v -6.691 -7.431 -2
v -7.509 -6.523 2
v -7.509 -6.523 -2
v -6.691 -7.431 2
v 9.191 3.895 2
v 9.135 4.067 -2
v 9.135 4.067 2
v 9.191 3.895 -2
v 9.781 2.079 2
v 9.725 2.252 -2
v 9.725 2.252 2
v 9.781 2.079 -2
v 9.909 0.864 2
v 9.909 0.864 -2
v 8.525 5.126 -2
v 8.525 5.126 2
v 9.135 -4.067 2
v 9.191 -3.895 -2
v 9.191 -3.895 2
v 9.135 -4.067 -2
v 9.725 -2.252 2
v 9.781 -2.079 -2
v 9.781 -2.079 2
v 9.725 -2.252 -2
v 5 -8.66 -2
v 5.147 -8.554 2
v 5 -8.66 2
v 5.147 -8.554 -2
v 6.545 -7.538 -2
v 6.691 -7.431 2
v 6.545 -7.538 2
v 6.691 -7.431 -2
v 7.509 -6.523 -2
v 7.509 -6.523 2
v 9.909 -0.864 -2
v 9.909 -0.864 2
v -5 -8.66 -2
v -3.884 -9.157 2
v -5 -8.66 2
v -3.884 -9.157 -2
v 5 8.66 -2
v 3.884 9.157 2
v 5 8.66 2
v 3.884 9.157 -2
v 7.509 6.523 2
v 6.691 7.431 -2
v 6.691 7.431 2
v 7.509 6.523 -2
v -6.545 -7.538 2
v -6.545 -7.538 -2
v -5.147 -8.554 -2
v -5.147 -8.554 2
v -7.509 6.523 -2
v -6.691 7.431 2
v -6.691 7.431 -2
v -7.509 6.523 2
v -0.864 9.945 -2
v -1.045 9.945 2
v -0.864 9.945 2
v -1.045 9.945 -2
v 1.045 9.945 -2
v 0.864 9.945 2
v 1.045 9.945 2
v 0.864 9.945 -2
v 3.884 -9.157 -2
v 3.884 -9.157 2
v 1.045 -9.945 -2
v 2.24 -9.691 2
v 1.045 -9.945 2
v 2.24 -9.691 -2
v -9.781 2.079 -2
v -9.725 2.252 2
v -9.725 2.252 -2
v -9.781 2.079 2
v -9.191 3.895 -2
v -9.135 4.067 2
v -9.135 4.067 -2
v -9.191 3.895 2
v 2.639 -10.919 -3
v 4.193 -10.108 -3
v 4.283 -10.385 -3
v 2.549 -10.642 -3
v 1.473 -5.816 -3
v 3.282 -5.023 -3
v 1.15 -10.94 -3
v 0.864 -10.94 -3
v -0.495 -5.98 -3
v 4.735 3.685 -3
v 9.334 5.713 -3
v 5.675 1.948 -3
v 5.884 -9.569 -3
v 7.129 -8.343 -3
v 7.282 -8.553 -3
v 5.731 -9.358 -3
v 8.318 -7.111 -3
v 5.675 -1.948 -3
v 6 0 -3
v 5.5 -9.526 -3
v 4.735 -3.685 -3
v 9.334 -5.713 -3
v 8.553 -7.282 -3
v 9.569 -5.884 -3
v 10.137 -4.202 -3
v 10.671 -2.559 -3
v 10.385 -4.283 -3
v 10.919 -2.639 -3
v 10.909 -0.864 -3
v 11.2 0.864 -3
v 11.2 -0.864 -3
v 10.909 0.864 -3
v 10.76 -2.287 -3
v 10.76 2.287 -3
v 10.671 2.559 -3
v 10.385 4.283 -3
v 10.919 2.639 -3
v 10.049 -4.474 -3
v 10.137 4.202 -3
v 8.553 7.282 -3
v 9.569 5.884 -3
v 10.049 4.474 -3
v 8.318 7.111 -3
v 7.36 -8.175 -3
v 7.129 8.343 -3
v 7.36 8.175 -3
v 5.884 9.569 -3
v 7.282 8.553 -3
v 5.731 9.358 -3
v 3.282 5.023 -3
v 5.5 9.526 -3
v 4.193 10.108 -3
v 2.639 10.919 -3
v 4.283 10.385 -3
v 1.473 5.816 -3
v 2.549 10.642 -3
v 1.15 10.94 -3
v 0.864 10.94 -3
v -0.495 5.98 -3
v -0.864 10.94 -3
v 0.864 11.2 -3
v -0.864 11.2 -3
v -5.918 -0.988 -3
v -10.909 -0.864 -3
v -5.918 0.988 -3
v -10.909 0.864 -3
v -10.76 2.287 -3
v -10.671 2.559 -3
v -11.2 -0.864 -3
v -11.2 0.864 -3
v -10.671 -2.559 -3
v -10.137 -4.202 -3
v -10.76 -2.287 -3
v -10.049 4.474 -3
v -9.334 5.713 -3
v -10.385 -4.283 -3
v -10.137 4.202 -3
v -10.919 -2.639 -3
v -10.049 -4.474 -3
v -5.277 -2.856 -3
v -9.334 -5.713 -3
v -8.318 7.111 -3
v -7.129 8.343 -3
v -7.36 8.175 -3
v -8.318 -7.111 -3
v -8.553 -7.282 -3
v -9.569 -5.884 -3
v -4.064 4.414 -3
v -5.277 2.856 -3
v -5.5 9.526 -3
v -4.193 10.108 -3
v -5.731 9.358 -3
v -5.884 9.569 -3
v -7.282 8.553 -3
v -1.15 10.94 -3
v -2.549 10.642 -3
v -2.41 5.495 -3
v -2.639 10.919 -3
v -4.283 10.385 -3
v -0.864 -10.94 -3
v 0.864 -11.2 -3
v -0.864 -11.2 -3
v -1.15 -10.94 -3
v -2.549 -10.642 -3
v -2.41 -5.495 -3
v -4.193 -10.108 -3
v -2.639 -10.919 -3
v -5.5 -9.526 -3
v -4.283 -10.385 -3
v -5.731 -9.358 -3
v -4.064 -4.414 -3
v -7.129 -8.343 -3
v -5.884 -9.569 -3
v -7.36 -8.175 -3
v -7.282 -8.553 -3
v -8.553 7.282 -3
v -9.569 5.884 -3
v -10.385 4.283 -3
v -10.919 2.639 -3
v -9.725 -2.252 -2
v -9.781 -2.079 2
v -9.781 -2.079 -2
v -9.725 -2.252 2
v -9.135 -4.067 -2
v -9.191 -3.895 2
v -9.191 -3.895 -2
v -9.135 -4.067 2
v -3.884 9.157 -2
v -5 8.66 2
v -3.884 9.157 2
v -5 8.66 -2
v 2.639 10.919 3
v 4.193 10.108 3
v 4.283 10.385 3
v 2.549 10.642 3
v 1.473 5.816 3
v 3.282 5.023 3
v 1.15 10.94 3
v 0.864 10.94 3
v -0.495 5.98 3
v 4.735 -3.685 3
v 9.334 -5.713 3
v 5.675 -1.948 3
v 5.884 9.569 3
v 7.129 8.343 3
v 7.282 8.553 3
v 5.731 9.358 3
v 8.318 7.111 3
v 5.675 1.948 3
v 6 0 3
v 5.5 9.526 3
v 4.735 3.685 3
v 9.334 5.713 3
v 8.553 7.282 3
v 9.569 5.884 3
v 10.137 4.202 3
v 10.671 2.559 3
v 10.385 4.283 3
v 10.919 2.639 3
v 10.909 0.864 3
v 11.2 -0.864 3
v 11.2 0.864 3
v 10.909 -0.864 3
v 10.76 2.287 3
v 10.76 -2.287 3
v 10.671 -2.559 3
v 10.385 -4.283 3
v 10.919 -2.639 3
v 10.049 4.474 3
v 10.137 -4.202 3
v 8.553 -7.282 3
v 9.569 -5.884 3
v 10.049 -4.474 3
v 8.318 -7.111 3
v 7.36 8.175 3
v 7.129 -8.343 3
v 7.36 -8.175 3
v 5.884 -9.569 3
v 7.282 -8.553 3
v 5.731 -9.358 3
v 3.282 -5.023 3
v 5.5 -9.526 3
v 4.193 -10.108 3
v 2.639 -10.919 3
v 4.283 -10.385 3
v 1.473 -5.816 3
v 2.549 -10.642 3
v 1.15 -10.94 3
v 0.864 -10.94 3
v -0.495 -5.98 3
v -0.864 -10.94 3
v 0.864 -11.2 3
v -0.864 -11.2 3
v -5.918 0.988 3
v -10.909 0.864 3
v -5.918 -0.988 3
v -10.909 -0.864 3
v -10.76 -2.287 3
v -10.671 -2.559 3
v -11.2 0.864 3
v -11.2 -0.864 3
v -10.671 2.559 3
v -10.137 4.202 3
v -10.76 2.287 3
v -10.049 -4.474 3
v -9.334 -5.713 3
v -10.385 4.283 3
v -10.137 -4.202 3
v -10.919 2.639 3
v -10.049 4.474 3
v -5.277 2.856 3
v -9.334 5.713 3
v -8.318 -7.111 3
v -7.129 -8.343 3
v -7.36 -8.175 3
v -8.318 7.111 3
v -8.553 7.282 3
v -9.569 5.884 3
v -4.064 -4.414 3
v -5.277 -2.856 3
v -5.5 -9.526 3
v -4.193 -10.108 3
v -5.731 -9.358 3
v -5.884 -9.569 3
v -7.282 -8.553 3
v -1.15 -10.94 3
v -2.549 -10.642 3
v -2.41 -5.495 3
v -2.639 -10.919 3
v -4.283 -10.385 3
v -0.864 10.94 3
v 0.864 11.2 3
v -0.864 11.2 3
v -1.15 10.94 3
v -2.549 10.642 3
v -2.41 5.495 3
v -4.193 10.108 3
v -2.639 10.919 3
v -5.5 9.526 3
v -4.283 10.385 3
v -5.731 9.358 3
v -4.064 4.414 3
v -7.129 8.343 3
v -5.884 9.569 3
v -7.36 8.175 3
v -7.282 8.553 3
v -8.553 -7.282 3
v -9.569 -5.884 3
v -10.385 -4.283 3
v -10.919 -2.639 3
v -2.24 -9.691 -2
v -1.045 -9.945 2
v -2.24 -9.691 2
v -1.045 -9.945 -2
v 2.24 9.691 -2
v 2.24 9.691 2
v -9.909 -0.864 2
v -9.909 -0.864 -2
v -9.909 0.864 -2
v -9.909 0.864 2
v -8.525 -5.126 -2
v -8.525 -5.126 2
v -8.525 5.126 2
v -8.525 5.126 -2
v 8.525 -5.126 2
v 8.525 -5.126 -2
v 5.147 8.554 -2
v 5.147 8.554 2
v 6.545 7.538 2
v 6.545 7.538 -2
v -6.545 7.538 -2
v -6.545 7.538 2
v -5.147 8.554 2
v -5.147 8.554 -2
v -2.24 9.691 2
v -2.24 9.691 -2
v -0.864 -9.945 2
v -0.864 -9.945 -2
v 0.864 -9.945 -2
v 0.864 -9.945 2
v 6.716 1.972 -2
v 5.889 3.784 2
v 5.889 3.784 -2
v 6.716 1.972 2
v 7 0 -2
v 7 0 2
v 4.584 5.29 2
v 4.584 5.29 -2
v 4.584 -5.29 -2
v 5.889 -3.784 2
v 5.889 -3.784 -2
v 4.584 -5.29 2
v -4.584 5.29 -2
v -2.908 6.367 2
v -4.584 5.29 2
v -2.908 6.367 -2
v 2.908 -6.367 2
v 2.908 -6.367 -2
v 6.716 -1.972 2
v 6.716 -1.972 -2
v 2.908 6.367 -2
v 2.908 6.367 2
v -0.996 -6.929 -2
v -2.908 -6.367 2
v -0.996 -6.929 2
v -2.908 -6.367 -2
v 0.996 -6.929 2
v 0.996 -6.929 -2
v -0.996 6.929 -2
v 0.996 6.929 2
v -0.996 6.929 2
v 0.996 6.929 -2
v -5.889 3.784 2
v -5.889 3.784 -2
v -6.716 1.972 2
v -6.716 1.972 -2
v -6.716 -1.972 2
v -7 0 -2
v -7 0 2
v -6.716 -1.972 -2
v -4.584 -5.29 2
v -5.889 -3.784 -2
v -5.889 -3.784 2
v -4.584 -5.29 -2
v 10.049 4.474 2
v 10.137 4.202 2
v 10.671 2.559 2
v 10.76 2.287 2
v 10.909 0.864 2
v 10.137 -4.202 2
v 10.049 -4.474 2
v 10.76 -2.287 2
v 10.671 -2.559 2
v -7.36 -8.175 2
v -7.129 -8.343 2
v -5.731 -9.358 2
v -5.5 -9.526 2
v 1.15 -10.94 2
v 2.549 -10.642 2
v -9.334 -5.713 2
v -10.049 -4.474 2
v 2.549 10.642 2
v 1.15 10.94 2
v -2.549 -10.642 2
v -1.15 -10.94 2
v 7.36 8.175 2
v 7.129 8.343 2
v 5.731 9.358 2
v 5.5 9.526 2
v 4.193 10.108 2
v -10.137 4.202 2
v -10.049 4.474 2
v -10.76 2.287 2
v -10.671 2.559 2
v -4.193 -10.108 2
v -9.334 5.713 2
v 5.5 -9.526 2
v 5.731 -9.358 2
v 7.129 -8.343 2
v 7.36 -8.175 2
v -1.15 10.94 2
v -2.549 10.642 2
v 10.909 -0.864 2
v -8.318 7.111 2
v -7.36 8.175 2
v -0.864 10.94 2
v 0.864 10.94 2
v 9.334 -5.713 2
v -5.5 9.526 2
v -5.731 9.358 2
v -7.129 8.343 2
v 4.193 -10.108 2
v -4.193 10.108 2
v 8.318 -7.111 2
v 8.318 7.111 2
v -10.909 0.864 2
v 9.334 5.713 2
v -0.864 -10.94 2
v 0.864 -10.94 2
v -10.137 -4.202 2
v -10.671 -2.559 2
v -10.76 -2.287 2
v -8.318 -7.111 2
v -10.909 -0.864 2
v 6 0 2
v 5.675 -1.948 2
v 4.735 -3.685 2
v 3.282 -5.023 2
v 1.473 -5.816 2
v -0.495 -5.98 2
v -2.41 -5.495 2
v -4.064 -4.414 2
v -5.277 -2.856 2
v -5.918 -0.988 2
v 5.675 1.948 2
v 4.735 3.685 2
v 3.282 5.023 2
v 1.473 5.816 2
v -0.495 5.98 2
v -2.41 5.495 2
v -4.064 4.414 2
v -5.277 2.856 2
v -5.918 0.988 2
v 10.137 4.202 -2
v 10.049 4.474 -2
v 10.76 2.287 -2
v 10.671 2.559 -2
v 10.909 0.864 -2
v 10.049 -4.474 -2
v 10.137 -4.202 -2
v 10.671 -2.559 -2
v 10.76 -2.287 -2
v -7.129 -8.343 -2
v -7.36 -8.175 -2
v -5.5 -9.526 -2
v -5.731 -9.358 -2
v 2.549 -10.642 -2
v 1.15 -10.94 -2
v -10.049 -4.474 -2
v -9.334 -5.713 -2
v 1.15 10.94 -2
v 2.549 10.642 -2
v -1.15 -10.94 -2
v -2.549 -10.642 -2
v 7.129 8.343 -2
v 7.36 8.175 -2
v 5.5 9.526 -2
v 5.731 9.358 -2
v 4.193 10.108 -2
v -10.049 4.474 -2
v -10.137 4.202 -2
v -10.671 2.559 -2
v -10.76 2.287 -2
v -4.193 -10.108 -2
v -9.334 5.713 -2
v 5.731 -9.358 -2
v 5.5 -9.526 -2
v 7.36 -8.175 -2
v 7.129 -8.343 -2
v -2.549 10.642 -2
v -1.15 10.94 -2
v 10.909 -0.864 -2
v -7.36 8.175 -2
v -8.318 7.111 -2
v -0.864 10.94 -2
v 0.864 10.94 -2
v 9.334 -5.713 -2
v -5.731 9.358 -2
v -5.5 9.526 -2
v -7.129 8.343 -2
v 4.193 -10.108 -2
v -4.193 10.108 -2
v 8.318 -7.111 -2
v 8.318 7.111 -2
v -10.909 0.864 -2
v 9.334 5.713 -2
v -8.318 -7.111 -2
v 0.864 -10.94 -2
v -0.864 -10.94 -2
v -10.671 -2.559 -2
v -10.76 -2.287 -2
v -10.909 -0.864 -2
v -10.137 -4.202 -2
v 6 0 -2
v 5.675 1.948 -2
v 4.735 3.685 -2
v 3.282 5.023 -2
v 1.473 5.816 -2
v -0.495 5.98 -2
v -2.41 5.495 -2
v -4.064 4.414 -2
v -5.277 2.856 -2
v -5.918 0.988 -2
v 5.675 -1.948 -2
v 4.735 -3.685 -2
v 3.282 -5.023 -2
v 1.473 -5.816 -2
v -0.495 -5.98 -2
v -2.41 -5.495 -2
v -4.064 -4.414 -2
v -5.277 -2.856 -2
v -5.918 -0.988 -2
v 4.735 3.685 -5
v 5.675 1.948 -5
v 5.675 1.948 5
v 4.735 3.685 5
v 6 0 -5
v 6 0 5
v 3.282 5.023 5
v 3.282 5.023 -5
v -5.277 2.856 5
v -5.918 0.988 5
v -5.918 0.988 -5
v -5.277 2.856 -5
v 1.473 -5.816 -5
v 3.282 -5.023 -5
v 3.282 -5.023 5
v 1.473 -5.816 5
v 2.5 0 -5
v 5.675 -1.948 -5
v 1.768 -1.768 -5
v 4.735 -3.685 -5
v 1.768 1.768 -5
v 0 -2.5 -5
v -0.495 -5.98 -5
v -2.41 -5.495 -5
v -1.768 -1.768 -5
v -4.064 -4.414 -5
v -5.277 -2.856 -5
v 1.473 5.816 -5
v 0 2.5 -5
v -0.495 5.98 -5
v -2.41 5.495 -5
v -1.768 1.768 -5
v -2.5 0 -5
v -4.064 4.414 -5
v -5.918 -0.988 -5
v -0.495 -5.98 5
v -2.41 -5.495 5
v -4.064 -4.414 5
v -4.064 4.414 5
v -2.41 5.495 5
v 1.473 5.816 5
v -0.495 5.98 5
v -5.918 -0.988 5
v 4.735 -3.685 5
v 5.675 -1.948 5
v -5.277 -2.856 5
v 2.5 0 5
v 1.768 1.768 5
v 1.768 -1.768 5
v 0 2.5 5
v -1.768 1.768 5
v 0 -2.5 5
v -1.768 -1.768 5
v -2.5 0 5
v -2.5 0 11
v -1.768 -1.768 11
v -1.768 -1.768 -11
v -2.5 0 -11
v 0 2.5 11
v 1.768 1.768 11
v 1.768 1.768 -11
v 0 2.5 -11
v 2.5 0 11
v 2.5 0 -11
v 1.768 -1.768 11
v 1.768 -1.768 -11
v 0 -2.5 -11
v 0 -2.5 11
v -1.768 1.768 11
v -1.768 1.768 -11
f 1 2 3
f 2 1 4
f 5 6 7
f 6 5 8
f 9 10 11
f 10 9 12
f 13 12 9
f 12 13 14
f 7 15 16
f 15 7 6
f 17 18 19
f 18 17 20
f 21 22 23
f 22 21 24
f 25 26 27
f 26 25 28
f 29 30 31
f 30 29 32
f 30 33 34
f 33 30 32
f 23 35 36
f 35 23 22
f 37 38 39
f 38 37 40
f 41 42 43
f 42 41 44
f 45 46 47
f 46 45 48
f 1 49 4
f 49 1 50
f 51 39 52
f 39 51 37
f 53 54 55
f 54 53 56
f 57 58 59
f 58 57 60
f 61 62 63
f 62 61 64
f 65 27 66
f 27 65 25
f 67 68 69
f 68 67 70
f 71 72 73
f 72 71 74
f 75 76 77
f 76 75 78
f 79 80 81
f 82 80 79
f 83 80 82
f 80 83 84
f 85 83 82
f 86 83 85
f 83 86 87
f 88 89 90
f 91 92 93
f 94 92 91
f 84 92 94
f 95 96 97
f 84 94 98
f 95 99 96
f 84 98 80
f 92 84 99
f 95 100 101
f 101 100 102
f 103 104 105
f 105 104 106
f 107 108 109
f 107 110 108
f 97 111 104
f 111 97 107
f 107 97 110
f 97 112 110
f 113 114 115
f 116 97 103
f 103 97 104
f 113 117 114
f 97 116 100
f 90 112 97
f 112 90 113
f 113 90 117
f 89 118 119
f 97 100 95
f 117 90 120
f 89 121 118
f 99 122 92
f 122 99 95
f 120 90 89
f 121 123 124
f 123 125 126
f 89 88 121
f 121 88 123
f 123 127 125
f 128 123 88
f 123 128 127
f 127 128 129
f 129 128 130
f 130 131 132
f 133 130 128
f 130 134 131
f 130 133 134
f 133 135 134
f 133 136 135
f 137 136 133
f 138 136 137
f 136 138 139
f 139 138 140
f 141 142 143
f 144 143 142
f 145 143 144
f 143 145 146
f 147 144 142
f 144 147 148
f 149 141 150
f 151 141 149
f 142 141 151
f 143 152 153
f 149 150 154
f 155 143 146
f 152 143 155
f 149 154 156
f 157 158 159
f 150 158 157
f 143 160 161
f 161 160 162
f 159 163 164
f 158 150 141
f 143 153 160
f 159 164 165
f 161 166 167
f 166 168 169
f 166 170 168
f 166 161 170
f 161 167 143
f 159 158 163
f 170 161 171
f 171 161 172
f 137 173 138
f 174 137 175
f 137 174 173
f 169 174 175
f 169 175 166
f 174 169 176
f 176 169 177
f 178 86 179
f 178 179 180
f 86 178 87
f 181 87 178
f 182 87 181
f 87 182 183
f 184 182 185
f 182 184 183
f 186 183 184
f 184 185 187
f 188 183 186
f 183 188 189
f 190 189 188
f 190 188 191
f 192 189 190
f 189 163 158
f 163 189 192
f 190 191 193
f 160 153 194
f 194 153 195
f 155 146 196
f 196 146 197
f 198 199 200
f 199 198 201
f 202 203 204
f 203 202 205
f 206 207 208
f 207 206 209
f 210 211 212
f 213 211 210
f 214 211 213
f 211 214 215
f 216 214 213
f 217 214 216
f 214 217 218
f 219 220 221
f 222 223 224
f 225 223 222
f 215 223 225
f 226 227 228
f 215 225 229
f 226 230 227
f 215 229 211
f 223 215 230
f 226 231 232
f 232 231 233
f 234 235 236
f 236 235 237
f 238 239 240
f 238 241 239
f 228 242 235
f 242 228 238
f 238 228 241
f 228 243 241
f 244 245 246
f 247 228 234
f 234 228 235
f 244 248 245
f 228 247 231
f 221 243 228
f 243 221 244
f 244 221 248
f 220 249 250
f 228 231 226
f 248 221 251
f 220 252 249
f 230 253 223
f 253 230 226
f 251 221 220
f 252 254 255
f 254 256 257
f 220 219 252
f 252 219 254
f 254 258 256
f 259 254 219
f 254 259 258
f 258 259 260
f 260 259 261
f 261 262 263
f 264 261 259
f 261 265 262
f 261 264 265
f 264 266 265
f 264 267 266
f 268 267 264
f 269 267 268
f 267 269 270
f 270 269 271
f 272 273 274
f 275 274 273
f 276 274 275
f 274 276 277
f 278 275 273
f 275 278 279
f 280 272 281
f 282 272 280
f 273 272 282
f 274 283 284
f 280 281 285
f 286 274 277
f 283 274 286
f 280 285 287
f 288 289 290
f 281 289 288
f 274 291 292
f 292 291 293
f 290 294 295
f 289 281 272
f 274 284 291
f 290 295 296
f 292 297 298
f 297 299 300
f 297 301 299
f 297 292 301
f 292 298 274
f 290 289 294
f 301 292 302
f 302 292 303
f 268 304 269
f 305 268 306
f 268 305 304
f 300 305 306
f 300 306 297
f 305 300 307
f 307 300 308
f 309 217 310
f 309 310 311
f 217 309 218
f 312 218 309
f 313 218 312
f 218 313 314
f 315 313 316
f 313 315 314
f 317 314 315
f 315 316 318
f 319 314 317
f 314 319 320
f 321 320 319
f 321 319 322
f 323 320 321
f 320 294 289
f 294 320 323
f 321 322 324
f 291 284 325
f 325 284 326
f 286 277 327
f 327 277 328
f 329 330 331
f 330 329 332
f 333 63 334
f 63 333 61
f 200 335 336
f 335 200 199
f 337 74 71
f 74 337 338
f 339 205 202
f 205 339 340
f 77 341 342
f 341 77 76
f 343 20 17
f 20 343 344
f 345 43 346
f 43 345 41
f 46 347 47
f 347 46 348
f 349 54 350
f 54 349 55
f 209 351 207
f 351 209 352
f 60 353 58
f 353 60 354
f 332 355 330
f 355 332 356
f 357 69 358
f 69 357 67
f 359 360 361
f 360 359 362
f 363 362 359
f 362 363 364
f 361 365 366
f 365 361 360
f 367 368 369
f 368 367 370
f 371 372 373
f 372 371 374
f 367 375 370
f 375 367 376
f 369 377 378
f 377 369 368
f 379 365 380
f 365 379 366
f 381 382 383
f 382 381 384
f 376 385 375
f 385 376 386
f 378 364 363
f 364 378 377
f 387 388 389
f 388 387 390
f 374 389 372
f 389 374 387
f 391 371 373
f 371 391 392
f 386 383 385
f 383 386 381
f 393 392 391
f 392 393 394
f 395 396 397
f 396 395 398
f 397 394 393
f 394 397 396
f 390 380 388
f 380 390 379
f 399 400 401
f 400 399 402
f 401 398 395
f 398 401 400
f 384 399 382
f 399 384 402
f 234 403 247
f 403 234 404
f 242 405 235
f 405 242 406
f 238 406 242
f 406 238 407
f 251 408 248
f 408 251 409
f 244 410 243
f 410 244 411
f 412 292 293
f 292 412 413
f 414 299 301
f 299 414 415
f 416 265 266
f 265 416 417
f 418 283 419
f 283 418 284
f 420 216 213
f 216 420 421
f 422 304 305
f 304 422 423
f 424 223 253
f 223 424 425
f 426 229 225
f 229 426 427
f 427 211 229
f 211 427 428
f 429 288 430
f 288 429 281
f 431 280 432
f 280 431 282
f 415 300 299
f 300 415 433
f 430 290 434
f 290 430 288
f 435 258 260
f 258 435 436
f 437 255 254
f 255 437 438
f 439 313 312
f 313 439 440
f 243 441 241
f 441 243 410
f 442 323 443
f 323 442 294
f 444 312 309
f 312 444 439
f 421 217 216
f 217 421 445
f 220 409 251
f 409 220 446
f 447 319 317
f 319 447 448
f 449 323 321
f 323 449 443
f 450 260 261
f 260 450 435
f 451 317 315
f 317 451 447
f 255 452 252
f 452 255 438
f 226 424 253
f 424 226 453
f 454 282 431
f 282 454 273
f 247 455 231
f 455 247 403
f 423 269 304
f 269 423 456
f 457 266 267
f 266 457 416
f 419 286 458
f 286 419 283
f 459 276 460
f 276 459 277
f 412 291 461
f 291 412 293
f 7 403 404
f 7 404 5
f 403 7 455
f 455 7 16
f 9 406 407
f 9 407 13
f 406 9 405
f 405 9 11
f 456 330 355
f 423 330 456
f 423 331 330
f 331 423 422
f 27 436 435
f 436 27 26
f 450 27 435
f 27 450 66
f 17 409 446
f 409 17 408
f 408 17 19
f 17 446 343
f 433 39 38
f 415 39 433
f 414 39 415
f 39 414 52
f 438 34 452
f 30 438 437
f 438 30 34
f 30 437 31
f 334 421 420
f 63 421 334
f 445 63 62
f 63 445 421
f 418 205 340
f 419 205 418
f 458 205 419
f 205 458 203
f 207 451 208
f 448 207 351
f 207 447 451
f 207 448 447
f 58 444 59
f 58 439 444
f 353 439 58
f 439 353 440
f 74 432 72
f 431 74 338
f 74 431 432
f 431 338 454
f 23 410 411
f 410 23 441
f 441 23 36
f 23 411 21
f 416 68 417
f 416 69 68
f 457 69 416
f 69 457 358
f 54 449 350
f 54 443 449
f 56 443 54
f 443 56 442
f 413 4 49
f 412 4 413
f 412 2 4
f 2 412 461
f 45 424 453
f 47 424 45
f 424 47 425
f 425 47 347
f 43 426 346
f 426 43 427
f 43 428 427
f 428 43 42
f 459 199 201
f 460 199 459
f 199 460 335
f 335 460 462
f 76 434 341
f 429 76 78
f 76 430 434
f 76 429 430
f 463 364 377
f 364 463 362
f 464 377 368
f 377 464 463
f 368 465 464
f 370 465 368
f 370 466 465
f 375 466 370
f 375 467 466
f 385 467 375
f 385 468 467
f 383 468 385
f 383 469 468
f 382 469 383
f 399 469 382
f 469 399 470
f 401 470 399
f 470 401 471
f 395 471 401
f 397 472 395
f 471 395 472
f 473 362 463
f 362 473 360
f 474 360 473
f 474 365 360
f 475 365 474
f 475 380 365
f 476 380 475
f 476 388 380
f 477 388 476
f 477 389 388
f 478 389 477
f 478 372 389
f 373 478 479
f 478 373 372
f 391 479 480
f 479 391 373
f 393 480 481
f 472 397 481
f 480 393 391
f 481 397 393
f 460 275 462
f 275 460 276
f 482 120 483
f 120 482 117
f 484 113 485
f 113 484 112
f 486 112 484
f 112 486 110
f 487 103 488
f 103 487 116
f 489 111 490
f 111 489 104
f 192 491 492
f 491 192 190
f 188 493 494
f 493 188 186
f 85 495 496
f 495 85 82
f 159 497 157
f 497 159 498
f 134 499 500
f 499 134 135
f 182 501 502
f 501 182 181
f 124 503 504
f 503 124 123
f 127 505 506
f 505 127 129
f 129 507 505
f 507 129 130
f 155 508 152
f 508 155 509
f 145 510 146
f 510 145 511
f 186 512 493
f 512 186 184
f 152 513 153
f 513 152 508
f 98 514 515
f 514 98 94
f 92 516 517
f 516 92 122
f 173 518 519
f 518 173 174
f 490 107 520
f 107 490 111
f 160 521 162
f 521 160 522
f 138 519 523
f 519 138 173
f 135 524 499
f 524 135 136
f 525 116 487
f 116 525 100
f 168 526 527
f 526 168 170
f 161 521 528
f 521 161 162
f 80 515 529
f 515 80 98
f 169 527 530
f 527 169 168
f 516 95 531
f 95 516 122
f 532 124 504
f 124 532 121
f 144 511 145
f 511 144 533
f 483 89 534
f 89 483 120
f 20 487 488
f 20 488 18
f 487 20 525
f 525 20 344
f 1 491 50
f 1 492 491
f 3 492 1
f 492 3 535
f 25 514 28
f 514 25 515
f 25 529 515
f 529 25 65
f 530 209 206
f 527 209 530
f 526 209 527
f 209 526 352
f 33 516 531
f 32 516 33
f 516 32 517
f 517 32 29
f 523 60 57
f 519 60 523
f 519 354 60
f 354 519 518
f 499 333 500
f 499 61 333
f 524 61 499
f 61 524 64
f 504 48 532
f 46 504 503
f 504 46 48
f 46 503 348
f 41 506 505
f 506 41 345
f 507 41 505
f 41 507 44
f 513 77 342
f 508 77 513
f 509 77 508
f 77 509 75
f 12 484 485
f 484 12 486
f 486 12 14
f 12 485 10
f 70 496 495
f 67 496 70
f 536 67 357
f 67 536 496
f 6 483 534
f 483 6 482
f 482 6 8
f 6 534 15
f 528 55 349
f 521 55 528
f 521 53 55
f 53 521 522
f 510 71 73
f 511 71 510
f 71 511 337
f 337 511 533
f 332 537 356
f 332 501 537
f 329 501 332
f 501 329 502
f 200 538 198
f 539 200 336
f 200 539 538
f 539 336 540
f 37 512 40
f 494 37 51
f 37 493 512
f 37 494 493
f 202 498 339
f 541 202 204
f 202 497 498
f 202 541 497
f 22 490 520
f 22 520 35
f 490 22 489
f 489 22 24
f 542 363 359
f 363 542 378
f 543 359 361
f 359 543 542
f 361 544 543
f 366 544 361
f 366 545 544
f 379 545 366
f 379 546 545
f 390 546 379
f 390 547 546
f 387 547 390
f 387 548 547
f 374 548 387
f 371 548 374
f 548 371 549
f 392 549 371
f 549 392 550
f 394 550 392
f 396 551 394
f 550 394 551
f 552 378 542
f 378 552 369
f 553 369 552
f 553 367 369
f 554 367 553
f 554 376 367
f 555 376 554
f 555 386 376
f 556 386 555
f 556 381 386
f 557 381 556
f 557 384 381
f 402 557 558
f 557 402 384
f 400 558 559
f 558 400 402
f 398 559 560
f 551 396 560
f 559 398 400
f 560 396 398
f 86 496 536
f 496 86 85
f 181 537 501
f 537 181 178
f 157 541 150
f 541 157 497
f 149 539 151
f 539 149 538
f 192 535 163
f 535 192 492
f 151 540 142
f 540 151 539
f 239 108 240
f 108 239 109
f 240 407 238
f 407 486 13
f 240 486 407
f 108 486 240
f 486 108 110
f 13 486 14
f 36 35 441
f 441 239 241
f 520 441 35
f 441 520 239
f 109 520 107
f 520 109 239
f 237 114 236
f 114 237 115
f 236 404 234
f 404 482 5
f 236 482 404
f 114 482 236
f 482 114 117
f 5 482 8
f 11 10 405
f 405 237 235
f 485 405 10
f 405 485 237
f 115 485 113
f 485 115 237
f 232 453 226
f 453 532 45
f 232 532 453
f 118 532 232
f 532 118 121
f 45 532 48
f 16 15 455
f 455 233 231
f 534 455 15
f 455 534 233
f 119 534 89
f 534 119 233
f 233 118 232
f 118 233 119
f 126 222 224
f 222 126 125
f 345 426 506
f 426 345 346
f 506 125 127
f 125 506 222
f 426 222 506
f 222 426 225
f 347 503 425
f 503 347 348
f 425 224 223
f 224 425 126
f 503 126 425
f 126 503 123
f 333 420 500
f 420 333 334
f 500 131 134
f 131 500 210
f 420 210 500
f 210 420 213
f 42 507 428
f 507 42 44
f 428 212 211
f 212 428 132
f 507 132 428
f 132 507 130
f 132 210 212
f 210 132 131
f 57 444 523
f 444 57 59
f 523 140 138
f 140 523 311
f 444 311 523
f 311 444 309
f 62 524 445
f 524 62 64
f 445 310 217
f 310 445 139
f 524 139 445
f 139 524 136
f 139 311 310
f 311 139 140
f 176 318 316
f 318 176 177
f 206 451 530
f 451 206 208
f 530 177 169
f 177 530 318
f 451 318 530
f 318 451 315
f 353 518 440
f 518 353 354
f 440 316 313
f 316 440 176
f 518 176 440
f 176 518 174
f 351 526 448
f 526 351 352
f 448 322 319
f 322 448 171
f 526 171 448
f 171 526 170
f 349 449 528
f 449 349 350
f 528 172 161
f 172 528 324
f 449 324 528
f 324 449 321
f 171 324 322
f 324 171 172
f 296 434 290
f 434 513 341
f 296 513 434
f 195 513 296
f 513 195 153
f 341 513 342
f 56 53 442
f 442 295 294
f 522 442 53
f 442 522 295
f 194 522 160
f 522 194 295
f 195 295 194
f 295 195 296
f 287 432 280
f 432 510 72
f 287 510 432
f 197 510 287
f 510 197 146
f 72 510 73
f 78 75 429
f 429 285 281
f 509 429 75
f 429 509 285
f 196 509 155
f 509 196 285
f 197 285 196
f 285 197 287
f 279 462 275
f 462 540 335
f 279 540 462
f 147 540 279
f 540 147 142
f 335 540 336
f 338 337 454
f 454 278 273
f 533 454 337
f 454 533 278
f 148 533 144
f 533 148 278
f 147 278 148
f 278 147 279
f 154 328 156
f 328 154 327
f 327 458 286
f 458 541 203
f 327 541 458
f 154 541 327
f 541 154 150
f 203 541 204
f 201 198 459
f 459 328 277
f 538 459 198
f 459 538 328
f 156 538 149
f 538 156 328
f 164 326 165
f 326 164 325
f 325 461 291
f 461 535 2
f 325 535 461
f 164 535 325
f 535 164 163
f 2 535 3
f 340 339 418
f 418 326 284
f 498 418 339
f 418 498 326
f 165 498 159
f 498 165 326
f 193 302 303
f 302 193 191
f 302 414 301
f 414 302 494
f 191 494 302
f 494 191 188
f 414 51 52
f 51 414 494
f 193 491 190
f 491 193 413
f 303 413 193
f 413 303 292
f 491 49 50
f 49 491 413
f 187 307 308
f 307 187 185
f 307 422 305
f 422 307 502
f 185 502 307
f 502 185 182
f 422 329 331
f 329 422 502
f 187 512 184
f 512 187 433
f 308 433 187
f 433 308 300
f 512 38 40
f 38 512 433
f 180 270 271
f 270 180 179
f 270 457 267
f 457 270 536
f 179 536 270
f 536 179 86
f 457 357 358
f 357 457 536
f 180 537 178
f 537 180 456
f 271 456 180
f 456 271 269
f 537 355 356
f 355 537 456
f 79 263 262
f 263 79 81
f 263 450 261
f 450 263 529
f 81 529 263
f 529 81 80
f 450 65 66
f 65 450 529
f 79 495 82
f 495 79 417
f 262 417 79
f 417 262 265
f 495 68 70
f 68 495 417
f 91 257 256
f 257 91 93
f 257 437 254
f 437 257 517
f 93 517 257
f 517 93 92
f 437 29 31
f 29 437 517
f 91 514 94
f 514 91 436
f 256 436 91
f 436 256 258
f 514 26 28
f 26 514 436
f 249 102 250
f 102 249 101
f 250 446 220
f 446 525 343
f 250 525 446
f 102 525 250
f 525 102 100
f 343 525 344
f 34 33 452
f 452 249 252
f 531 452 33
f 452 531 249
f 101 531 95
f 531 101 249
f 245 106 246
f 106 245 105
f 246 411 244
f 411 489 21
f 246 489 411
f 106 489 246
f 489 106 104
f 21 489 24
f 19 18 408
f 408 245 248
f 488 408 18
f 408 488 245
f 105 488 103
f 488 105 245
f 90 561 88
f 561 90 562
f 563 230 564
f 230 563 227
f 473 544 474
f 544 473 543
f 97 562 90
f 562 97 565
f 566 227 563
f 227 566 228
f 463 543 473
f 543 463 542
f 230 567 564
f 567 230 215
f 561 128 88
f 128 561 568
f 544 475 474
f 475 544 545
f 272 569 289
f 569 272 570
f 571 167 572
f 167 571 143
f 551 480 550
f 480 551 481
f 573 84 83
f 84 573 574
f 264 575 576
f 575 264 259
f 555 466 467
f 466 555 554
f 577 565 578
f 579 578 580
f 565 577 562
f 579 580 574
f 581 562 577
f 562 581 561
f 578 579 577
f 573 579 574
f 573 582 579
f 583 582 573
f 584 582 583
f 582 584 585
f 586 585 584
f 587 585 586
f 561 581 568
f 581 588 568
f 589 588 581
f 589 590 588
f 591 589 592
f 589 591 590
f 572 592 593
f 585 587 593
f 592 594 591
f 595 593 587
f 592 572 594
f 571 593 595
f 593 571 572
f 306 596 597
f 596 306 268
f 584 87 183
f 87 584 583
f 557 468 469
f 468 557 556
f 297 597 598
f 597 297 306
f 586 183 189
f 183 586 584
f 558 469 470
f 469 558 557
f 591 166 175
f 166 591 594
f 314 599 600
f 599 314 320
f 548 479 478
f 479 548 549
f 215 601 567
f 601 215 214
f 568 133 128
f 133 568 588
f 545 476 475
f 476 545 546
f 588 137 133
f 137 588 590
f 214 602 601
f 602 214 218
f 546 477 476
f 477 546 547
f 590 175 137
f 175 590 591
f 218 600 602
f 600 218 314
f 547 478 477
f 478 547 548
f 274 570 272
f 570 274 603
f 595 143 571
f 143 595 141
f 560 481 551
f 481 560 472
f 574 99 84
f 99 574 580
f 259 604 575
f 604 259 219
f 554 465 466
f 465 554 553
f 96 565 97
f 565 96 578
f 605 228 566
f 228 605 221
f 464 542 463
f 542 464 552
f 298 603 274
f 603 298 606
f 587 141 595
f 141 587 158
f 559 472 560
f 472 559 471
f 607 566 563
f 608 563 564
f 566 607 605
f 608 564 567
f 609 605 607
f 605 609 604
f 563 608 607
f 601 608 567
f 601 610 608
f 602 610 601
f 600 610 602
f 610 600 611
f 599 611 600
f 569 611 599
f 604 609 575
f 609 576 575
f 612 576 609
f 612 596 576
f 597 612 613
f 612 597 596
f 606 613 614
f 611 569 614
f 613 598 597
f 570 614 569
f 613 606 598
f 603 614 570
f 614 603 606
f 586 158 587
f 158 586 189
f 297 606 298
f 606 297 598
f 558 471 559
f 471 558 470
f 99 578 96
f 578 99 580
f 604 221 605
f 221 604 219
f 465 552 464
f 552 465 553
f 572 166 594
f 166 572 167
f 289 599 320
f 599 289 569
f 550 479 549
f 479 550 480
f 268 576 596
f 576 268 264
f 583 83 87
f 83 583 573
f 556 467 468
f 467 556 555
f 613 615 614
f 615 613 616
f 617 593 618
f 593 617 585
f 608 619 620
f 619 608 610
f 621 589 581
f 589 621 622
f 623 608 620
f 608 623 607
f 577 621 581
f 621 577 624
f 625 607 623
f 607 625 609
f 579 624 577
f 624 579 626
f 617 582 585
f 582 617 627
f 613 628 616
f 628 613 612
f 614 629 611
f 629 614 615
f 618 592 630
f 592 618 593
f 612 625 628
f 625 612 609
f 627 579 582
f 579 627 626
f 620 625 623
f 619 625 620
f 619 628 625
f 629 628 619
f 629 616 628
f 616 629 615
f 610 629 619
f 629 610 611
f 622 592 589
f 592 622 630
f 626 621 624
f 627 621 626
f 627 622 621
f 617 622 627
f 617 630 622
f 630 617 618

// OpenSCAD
// Parameters
pulley_type = 1; //[0:1:1]
tooth_profile = 0; //[0:2:1]
tooth_count = 20; //[10:60:1]
outer_diameter_mm = 20; //[10:40:1]
belt_width_mm = 6; //[3:20:1]
bore_diameter_mm = 5; //[2.5:10:0.5]
hub_diameter_mm = 12; //[6:24:1]
hub_length_mm = 10; //[5:20:1]
flange_diameter_mm = 22; //[11:44:1]
flange_thickness_mm = 1; //[0:3:0.5]
set_screw_count = 0; //[0:2:1]
set_screw_diameter_mm = 3; //[0:6:0.5]
set_screw_z_offset_mm = 0; //[-5:5:0.5]
rim_wall_mm = 3; //[1.5:6:0.5]
tooth_radial_height_mm = 1.2; //[0:2.4:0.1]
tooth_tangential_width_factor = 0.55; //[0.3:0.8:0.05]
overlap_mm = 1; //[0.5:2:0.5]
set_screw_length_mm = 40; //[20:80:1]

// Pulley - complete geometry
module pulley() {
  color("Silver") {
    // Hub
    translate([0, 0, 0])
      cylinder(r=hub_diameter_mm/2, h=hub_length_mm, center=true);

    // Rim
    difference() {
      translate([0, 0, 0])
        cylinder(r=outer_diameter_mm/2, h=belt_width_mm, center=true);
      translate([0, 0, 0])
        cylinder(r=outer_diameter_mm/2 - rim_wall_mm, h=belt_width_mm + 2*overlap_mm, center=true);
    }

    // Flanges
    if (flange_thickness_mm > 0) {
      translate([0, 0, belt_width_mm/2 + flange_thickness_mm/2 - overlap_mm])
        cylinder(r=flange_diameter_mm/2, h=flange_thickness_mm, center=true);
      translate([0, 0, -(belt_width_mm/2 + flange_thickness_mm/2 - overlap_mm)])
        cylinder(r=flange_diameter_mm/2, h=flange_thickness_mm, center=true);
    }

    // Teeth
    if (pulley_type == 1 && tooth_radial_height_mm > 0) {
      for (i = [0:tooth_count-1]) {
        rotate([0, 0, i*360/tooth_count])
          translate([outer_diameter_mm/2 + (tooth_radial_height_mm + overlap_mm)/2 - overlap_mm, 0, 0])
          cube([tooth_radial_height_mm + overlap_mm, (PI*outer_diameter_mm/tooth_count) * tooth_tangential_width_factor, belt_width_mm], center=true);
      }
    }

    // Bore
    translate([0, 0, 0])
      cylinder(r=bore_diameter_mm/2, h=hub_length_mm + 2*flange_thickness_mm + belt_width_mm + 4*overlap_mm, center=true);

    // Set Screw Holes
    if (set_screw_diameter_mm > 0) {
      if (set_screw_count >= 1) {
        rotate([0, 90, 0])
          translate([0, 0, set_screw_z_offset_mm])
          cylinder(r=set_screw_diameter_mm/2, h=set_screw_length_mm, center=true);
      }
      if (set_screw_count == 2) {
        rotate([90, 0, 0])
          translate([0, 0, set_screw_z_offset_mm])
          cylinder(r=set_screw_diameter_mm/2, h=set_screw_length_mm, center=true);
      }
    }
  }
}

// Assembly
module assembly() {
  pulley();
}

assembly();
